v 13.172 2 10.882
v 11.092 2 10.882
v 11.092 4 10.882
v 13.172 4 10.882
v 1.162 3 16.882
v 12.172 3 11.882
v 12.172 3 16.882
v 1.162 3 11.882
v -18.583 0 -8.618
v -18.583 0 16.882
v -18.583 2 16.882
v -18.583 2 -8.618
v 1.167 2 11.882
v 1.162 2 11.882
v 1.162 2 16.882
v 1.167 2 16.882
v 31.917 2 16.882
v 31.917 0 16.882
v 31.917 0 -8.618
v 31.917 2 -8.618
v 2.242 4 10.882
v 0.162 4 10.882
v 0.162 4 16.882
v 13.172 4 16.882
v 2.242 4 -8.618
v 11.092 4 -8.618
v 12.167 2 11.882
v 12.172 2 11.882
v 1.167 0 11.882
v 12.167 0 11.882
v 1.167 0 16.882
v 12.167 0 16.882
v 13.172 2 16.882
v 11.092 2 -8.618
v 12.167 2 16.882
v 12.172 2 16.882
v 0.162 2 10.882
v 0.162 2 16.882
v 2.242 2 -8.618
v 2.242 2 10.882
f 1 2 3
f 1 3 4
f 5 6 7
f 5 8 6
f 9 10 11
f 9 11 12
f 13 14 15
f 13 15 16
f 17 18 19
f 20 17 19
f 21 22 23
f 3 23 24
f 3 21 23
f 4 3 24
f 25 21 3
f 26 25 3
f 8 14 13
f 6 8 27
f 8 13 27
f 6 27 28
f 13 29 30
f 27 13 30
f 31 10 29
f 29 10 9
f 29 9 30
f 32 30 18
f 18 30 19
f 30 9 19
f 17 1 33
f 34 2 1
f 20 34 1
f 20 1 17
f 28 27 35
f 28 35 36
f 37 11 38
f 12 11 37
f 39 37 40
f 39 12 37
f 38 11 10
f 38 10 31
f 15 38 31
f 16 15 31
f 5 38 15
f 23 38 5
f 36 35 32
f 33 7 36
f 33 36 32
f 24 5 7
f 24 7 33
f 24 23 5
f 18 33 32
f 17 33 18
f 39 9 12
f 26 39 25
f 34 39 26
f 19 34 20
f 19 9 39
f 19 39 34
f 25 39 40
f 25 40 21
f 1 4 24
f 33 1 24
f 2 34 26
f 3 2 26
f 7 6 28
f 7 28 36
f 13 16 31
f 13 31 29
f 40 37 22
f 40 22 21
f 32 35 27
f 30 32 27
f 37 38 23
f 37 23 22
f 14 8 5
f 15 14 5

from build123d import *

# Parameters (mm, degrees)
SKETCH1_W                = 50.5
SKETCH1_H                = 25.5
BOSS_EXTRUDE1_DEPTH      = 2
SKETCH2_W                = 11
SKETCH2_H                = 5
CUT_EXTRUDE1_DEPTH       = 2
SKETCH3_W                = 8.85
SKETCH3_H                = 20.5
BOSS_EXTRUDE2_DEPTH      = 1
MOVE_FACE1_BY            = 1
SKETCH4_W                = 8.85
SKETCH4_H                = 1
BOSS_EXTRUDE3_DEPTH      = 5
BOSS_EXTRUDE4_DEPTH      = 2
BOSS_EXTRUDE4_DEPTH_BACK = 11
SKETCH5_W                = 5
SKETCH5_H                = 1
MOVE_FACE3_BY            = 0.15
MOVE_FACE4_BY            = 0.08
MOVE_FACE5_BY            = 0.08
SKETCH8_W                = 1
SKETCH8_H                = 5
BOSS_EXTRUDE5_DEPTH      = 1
SKETCH9_W                = 2.08
SKETCH9_H                = 1
BOSS_EXTRUDE6_DEPTH      = 2
SKETCH10_W               = 2.08
SKETCH10_H               = 1
BOSS_EXTRUDE7_DEPTH      = 2


with BuildPart() as part:
    # Sketch1 → Boss-Extrude1 (new body)
    with BuildSketch(Plane(origin=(0, 0, 0), x_dir=(1, 0, 0), z_dir=(0, 1, 0))):
        with Locations((6.667134831, -4.132373596)):
            Rectangle(SKETCH1_W, SKETCH1_H)
    extrude(amount=BOSS_EXTRUDE1_DEPTH)

    # Sketch2 → Cut-Extrude1 (cut)
    with BuildSketch(Plane(origin=(0, 2, 0), x_dir=(1, 0, 0), z_dir=(0, 1, 0))):
        with Locations((6.667134831, -14.382373596)):
            Rectangle(SKETCH2_W, SKETCH2_H)
    extrude(amount=-CUT_EXTRUDE1_DEPTH, mode=Mode.SUBTRACT)



with BuildPart() as body_2:
    # Sketch3 → Boss-Extrude2 (new body)
    with BuildSketch(Plane(origin=(0, 2, 0), x_dir=(1, 0, 0), z_dir=(0, 1, 0))):
        with Locations((6.667134831, -1.632373596)):
            Rectangle(SKETCH3_W, SKETCH3_H)
    extrude(amount=BOSS_EXTRUDE2_DEPTH)

    # Move Face1: a face moved outward by 1.0
    extrude(body_2.faces().sort_by_distance((6.667134831, 3, 1.632373596))[0], amount=MOVE_FACE1_BY, dir=(0, 1, 0))

    # Sketch4 → Boss-Extrude3 (add)
    with BuildSketch(Plane.XY.offset(11.882373596)):
        with Locations((6.667134831, 3.5)):
            Rectangle(SKETCH4_W, SKETCH4_H)
    extrude(amount=BOSS_EXTRUDE3_DEPTH)

    # Sketch5 → Boss-Extrude4 (add, two sides: drawn at the far end of the back side and taken through both)
    with BuildSketch(Plane.ZY.offset(-2.242134831).offset(-BOSS_EXTRUDE4_DEPTH_BACK)):
        with Locations((14.382373596, 3.5)):
            Rectangle(SKETCH5_W, SKETCH5_H)
    extrude(amount=BOSS_EXTRUDE4_DEPTH + BOSS_EXTRUDE4_DEPTH_BACK)

    # Move Face3: a face moved inward by 0.15
    extrude(body_2.faces().sort_by_distance((13.242134831, 3.5, 14.382373596))[0], amount=MOVE_FACE3_BY, dir=(-1, 0, 0), mode=Mode.SUBTRACT)

    # Move Face4: a face moved outward by 0.08
    extrude(body_2.faces().sort_by_distance((0.242134831, 3.5, 14.382373596))[0], amount=MOVE_FACE4_BY, dir=(-1, 0, 0))

    # Move Face5: a face moved outward by 0.08
    extrude(body_2.faces().sort_by_distance((13.092134831, 3.5, 14.382373596))[0], amount=MOVE_FACE5_BY, dir=(1, 0, 0))


with BuildPart() as part_1:
    add(part.part)

    add(body_2.part)  # Boss-Extrude5 merges body 2
    # Sketch8 → Boss-Extrude5 (add)
    with BuildSketch(Plane.XZ.offset(-3)):
        with Locations((0.662134831, 14.382373596)):
            Rectangle(SKETCH8_W, SKETCH8_H)
        with Locations((12.672134831, 14.382373596)):
            Rectangle(SKETCH8_W, SKETCH8_H)
    extrude(amount=BOSS_EXTRUDE5_DEPTH)

    # Sketch9 → Boss-Extrude6 (add)
    with BuildSketch(Plane(origin=(0, 2, 0), x_dir=(1, 0, 0), z_dir=(0, 1, 0))):
        with Locations((12.132134831, -11.382373596)):
            Rectangle(SKETCH9_W, SKETCH9_H)
    extrude(amount=BOSS_EXTRUDE6_DEPTH)

    # Sketch10 → Boss-Extrude7 (add)
    with BuildSketch(Plane(origin=(0, 2, 0), x_dir=(1, 0, 0), z_dir=(0, 1, 0))):
        with Locations((1.202134831, -11.382373596)):
            Rectangle(SKETCH10_W, SKETCH10_H)
    extrude(amount=BOSS_EXTRUDE7_DEPTH)


solid = part_1.part
